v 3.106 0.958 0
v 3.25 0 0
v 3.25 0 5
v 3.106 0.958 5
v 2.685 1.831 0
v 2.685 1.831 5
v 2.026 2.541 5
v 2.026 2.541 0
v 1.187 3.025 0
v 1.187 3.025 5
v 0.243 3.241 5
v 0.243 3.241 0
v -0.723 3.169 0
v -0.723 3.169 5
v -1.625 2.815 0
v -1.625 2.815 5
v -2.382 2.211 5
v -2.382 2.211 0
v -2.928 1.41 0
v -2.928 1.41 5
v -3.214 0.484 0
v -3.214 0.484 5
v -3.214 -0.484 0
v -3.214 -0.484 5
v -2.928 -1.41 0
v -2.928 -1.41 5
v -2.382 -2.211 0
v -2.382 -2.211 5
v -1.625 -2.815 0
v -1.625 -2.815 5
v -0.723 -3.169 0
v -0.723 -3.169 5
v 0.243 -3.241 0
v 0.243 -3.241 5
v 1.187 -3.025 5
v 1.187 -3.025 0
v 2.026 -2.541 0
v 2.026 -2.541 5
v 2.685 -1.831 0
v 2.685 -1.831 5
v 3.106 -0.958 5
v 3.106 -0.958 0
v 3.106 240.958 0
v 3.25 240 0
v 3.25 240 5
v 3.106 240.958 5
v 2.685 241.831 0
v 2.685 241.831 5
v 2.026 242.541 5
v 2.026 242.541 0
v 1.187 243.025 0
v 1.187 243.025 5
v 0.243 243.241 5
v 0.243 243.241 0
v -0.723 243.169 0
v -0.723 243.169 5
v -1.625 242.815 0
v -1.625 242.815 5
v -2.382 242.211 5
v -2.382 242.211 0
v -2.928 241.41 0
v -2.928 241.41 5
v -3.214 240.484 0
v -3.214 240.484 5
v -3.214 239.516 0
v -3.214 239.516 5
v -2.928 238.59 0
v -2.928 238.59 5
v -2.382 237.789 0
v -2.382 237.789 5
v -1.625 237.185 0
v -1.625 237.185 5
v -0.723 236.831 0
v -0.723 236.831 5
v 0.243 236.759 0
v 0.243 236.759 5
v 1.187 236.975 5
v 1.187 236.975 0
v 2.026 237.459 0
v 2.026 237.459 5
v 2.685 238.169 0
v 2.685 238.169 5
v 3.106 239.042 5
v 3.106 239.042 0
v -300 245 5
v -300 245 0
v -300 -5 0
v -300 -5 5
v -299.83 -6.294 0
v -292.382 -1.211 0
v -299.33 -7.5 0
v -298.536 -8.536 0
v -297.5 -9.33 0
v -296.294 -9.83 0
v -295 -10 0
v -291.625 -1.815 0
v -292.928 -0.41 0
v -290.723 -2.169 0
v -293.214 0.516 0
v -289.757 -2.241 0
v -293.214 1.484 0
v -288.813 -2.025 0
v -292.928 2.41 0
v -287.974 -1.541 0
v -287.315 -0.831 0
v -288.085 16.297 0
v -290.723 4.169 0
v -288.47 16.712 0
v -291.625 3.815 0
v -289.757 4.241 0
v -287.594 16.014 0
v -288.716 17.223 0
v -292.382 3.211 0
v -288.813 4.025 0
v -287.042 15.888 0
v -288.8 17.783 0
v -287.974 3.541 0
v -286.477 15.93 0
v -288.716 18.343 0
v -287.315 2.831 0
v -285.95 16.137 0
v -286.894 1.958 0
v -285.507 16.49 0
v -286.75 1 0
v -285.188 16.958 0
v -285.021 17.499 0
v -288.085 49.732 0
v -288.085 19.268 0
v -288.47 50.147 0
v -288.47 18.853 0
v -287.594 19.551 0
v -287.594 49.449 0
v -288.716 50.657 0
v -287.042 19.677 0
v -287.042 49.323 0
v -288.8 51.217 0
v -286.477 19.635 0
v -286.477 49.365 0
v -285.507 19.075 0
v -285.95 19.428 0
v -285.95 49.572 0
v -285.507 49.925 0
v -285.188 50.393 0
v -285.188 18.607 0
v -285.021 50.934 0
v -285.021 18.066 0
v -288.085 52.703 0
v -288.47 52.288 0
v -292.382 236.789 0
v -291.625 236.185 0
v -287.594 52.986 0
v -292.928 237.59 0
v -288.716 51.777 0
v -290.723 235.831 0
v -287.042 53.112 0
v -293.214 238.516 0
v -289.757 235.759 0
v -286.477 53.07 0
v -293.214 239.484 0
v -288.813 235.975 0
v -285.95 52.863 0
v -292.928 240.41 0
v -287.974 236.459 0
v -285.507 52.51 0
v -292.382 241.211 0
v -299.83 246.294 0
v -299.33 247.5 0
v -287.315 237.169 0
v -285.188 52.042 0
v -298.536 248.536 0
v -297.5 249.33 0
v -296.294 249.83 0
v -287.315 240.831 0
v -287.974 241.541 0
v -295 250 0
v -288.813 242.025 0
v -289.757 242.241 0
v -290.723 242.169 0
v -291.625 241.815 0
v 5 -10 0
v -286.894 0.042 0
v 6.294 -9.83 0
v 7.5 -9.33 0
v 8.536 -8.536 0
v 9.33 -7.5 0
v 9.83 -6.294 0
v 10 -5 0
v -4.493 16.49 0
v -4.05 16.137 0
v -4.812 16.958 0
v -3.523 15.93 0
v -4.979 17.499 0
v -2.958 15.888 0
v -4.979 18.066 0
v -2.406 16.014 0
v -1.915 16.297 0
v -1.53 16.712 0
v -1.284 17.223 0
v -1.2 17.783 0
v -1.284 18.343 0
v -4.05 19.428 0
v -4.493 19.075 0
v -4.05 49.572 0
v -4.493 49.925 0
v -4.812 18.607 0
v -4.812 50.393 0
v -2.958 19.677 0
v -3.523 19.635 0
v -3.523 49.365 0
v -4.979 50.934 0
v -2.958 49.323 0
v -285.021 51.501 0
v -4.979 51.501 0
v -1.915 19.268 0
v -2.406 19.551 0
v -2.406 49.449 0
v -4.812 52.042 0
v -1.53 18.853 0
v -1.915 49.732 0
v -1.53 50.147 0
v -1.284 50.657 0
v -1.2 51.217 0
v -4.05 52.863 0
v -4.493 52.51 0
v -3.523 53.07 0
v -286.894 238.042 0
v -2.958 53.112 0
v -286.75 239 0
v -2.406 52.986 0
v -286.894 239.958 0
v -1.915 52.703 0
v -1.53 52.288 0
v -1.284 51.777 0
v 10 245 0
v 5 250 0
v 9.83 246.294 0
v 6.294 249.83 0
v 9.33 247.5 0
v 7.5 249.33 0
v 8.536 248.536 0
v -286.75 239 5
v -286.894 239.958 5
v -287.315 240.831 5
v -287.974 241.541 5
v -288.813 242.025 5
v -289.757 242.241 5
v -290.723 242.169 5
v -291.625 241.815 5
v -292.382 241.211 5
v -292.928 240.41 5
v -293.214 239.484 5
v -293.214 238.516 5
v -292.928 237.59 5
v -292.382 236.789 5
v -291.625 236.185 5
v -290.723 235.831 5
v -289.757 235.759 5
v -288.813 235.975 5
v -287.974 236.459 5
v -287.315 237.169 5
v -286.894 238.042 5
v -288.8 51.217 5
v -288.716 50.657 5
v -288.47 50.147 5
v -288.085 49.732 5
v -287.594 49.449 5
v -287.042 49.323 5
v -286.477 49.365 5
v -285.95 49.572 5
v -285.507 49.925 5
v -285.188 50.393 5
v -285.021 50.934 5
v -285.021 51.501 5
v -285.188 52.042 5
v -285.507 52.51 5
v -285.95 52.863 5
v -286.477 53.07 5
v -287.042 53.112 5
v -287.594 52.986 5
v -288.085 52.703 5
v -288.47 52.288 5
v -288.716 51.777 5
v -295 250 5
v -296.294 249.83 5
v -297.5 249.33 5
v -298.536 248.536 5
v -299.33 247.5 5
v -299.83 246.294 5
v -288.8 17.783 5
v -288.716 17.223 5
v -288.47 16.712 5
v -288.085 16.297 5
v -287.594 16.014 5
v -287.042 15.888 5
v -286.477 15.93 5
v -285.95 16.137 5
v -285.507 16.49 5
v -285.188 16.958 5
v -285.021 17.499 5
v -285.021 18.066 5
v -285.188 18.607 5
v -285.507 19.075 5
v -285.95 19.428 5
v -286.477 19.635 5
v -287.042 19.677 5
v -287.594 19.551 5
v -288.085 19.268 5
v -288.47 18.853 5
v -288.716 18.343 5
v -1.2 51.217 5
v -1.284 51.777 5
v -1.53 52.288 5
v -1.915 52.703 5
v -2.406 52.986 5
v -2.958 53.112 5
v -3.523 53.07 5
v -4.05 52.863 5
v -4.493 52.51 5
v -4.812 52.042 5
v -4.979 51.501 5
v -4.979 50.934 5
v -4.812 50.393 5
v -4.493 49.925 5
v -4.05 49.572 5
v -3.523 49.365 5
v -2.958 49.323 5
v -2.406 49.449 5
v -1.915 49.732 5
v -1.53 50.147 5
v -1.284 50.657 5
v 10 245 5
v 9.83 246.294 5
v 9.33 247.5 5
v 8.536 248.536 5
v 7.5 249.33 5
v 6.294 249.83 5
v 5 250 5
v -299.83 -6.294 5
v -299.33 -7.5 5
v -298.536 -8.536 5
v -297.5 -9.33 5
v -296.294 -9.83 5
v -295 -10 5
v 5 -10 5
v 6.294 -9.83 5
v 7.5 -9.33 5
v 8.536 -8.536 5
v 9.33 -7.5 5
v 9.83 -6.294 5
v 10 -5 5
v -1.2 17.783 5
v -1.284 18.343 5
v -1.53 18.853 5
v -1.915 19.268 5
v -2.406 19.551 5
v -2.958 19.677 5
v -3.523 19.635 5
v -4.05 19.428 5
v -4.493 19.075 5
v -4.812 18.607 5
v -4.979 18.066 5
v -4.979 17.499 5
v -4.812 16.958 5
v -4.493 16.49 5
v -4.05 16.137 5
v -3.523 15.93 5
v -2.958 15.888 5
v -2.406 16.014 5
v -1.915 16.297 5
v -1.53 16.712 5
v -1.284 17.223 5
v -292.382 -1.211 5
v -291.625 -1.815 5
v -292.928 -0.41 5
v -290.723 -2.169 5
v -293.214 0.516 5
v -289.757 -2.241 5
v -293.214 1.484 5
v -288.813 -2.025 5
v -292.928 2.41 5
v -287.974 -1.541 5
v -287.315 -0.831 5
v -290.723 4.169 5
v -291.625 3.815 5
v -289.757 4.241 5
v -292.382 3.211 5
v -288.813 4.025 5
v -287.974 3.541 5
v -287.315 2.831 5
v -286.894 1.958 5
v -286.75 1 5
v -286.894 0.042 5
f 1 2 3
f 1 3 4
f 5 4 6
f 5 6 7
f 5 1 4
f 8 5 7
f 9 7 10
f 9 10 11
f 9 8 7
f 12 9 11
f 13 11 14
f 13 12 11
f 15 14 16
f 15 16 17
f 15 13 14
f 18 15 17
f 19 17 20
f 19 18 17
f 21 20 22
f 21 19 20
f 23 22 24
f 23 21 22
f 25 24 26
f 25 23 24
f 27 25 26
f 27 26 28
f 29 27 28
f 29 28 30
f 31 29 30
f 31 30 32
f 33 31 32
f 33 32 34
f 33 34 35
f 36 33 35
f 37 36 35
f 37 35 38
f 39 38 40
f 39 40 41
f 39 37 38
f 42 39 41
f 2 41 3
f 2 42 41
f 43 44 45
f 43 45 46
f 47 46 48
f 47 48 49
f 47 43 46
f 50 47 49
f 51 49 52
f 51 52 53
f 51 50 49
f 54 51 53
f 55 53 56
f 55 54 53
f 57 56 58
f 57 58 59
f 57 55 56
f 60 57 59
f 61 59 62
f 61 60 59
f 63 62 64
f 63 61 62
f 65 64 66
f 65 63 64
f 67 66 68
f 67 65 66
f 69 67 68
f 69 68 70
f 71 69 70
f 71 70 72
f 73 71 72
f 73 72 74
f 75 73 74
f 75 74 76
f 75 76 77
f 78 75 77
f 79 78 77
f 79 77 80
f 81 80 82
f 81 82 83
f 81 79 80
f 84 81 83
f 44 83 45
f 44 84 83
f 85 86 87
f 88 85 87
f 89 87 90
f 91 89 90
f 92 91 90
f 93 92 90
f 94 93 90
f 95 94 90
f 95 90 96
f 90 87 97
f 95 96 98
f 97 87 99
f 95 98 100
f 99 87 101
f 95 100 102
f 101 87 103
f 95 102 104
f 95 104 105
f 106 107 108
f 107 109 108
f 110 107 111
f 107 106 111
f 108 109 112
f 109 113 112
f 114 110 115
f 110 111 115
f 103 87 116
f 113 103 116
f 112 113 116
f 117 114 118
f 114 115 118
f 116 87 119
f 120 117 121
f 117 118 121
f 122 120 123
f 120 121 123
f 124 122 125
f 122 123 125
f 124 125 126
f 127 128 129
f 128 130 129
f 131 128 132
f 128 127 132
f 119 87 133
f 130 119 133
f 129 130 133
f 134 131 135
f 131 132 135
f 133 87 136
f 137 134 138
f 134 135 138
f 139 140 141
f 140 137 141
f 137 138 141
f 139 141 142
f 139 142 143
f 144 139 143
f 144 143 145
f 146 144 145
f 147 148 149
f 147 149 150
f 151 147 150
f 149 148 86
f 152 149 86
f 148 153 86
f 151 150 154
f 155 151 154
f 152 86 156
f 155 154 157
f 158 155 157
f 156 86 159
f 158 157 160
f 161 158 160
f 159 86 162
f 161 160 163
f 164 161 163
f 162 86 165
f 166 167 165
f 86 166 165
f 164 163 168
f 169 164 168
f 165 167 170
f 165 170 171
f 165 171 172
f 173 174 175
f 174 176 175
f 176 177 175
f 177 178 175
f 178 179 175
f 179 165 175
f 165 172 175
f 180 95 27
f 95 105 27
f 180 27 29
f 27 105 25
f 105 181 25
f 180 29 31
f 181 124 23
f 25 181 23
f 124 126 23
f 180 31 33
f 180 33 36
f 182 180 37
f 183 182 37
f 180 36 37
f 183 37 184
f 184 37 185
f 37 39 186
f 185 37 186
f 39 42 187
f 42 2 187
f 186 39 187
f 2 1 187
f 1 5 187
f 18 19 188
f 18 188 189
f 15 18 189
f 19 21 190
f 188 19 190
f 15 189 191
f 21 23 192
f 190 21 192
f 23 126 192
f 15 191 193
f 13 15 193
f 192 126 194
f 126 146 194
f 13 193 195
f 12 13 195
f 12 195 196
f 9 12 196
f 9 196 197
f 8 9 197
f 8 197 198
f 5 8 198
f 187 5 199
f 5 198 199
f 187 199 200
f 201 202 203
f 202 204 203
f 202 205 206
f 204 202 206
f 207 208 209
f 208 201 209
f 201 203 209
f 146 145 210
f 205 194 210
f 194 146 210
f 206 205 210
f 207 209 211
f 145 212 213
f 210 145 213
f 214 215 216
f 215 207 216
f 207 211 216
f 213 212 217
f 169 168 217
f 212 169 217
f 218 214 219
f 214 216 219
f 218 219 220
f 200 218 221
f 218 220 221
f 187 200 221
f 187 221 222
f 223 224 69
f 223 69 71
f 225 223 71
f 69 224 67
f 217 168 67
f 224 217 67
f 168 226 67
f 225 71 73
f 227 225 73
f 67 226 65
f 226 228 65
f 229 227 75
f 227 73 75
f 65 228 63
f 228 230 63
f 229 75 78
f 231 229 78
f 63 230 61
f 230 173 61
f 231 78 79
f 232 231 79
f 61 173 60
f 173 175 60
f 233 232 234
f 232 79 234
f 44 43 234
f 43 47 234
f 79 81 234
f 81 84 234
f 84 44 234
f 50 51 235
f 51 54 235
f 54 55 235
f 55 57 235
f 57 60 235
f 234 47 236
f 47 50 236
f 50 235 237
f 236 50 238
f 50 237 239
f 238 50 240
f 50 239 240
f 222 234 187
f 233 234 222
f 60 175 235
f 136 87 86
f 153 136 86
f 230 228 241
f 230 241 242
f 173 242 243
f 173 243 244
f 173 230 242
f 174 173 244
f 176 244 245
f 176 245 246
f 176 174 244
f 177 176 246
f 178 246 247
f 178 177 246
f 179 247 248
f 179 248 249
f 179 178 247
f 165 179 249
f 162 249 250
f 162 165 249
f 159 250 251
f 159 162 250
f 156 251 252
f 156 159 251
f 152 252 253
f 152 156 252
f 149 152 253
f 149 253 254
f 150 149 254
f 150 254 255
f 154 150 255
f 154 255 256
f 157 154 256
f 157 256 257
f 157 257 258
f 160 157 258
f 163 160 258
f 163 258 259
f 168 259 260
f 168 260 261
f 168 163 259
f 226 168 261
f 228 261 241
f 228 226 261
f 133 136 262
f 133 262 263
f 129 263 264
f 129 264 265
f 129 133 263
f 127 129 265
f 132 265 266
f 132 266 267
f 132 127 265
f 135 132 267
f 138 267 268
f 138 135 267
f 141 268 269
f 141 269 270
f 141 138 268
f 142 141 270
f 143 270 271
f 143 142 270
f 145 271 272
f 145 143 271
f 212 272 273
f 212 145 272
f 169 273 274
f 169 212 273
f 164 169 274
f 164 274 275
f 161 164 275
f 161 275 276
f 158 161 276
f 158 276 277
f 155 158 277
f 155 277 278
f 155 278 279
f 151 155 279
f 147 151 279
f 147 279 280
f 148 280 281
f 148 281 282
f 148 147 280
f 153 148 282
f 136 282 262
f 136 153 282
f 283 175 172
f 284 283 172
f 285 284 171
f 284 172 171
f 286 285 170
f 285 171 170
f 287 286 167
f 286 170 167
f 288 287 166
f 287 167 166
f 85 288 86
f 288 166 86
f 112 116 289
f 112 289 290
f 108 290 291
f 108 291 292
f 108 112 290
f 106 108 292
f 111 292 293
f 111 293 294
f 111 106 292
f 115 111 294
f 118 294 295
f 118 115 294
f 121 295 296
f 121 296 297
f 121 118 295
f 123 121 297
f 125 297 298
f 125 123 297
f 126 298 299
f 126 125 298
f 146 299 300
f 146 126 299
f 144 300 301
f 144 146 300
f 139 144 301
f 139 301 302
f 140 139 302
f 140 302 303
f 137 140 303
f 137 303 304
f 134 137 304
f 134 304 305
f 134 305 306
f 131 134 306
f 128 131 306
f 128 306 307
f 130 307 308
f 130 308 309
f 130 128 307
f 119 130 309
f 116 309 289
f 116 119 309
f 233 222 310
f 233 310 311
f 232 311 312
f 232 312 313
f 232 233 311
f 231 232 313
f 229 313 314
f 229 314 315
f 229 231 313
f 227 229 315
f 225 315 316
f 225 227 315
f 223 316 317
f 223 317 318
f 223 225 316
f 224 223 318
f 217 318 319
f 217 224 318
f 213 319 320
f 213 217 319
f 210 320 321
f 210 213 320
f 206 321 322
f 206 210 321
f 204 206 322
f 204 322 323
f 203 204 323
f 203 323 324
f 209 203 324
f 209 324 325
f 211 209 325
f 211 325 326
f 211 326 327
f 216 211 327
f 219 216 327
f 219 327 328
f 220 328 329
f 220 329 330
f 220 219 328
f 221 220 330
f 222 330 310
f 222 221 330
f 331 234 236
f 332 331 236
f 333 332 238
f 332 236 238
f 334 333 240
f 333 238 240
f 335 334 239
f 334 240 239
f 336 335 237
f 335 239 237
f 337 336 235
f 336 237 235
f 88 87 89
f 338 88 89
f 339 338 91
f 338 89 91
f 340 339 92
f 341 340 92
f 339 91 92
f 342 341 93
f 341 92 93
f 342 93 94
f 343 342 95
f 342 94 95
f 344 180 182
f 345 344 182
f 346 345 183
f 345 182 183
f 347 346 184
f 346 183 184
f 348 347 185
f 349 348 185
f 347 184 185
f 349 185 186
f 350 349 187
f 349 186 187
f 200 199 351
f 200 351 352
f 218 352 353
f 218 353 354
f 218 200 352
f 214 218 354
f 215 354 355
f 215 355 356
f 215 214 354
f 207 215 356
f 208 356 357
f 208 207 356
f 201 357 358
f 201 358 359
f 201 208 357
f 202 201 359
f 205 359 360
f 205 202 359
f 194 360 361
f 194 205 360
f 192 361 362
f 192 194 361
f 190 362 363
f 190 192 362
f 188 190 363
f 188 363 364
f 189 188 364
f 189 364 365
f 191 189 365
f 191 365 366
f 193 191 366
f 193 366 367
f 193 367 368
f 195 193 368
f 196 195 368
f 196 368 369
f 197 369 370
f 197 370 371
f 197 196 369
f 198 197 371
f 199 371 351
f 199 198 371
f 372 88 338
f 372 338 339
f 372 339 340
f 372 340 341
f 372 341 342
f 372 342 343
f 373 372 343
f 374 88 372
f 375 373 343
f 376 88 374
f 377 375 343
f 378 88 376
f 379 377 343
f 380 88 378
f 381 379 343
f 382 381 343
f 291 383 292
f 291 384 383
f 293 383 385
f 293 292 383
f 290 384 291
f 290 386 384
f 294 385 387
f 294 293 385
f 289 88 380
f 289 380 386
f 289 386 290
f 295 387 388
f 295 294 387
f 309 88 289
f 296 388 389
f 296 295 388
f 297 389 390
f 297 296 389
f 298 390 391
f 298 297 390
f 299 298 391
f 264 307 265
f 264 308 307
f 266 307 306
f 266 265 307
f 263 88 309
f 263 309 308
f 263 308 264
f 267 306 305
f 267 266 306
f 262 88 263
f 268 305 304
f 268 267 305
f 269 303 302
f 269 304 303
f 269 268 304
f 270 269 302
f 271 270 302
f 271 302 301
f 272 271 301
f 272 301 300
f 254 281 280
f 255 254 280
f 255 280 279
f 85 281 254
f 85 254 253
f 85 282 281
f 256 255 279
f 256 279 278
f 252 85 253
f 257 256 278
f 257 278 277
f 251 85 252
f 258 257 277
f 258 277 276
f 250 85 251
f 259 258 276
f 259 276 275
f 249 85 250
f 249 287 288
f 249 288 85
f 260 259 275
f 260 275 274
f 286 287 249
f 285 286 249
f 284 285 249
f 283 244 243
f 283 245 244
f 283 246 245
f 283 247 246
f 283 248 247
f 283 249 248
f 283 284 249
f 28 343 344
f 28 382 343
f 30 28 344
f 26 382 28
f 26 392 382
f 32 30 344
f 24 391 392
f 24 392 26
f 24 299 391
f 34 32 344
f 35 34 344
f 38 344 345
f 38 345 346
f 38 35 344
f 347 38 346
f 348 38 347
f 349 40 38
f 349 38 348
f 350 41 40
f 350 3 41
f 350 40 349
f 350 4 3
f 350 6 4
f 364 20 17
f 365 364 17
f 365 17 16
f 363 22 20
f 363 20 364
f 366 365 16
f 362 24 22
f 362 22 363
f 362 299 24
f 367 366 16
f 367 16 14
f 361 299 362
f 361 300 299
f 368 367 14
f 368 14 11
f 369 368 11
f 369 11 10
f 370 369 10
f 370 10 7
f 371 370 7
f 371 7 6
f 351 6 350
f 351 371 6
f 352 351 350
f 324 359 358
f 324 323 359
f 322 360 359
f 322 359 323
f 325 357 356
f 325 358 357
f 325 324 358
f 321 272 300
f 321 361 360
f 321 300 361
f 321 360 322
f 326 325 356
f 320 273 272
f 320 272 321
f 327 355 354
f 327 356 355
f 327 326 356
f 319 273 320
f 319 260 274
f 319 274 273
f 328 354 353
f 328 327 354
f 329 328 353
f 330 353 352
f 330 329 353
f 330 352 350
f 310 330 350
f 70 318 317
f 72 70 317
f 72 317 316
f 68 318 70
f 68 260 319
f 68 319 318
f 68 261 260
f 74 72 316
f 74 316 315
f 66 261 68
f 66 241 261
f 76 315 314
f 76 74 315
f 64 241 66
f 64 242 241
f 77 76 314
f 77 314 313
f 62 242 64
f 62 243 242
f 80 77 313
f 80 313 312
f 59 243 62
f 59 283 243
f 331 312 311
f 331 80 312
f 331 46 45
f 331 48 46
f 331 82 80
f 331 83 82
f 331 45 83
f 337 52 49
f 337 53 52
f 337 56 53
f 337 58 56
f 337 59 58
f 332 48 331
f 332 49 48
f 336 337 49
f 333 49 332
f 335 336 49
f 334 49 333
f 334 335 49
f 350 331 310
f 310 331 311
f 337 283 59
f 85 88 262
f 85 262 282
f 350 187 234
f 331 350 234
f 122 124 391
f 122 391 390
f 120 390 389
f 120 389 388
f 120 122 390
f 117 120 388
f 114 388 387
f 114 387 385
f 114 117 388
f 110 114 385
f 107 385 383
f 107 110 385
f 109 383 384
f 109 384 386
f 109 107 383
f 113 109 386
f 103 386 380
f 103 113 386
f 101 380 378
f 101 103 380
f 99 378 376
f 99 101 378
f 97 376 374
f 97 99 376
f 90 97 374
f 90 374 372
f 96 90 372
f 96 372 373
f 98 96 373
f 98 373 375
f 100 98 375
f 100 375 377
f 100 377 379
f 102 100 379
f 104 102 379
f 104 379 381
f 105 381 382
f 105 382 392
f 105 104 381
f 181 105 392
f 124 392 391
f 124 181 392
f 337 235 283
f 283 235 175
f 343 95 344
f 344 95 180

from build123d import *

# Parameters (mm, degrees)
SKETCH1_R           = 3.25
SKETCH1_R_2         = 1.9
BOSS_EXTRUDE1_DEPTH = 5


with BuildPart() as part:
    # Sketch1 → Boss-Extrude1 (new body)
    with BuildSketch(Plane.XY):
        with BuildLine():
            Line((-295, -10), (5, -10))
            ThreePointArc((5, -10), (8.535533906, -8.535533906), (10, -5))
            Line((10, -5), (10, 245))
            ThreePointArc((10, 245), (8.535533906, 248.535533906), (5, 250))
            Line((5, 250), (-295, 250))
            ThreePointArc((-295, 250), (-298.535533906, 248.535533906), (-300, 245))
            Line((-300, 245), (-300, -5))
            ThreePointArc((-300, -5), (-298.535533906, -8.535533906), (-295, -10))
        make_face()
        Circle(SKETCH1_R, mode=Mode.SUBTRACT)
        with Locations((0, 240)):
            Circle(SKETCH1_R, mode=Mode.SUBTRACT)
        with Locations((-290, 239)):
            Circle(SKETCH1_R, mode=Mode.SUBTRACT)
        with Locations((-290, 1)):
            Circle(SKETCH1_R, mode=Mode.SUBTRACT)
        with Locations(Location((-286.899999971, 51.217380491, 0), (0, 0, 180))):
            Circle(SKETCH1_R_2, mode=Mode.SUBTRACT)
        with Locations(Location((-286.899999971, 17.782619509, 0), (0, 0, 180))):
            Circle(SKETCH1_R_2, mode=Mode.SUBTRACT)
        with Locations((-3.100000029, 17.782619509)):
            Circle(SKETCH1_R_2, mode=Mode.SUBTRACT)
        with Locations((-3.100000029, 51.217380491)):
            Circle(SKETCH1_R_2, mode=Mode.SUBTRACT)
    extrude(amount=BOSS_EXTRUDE1_DEPTH)


solid = part.part
